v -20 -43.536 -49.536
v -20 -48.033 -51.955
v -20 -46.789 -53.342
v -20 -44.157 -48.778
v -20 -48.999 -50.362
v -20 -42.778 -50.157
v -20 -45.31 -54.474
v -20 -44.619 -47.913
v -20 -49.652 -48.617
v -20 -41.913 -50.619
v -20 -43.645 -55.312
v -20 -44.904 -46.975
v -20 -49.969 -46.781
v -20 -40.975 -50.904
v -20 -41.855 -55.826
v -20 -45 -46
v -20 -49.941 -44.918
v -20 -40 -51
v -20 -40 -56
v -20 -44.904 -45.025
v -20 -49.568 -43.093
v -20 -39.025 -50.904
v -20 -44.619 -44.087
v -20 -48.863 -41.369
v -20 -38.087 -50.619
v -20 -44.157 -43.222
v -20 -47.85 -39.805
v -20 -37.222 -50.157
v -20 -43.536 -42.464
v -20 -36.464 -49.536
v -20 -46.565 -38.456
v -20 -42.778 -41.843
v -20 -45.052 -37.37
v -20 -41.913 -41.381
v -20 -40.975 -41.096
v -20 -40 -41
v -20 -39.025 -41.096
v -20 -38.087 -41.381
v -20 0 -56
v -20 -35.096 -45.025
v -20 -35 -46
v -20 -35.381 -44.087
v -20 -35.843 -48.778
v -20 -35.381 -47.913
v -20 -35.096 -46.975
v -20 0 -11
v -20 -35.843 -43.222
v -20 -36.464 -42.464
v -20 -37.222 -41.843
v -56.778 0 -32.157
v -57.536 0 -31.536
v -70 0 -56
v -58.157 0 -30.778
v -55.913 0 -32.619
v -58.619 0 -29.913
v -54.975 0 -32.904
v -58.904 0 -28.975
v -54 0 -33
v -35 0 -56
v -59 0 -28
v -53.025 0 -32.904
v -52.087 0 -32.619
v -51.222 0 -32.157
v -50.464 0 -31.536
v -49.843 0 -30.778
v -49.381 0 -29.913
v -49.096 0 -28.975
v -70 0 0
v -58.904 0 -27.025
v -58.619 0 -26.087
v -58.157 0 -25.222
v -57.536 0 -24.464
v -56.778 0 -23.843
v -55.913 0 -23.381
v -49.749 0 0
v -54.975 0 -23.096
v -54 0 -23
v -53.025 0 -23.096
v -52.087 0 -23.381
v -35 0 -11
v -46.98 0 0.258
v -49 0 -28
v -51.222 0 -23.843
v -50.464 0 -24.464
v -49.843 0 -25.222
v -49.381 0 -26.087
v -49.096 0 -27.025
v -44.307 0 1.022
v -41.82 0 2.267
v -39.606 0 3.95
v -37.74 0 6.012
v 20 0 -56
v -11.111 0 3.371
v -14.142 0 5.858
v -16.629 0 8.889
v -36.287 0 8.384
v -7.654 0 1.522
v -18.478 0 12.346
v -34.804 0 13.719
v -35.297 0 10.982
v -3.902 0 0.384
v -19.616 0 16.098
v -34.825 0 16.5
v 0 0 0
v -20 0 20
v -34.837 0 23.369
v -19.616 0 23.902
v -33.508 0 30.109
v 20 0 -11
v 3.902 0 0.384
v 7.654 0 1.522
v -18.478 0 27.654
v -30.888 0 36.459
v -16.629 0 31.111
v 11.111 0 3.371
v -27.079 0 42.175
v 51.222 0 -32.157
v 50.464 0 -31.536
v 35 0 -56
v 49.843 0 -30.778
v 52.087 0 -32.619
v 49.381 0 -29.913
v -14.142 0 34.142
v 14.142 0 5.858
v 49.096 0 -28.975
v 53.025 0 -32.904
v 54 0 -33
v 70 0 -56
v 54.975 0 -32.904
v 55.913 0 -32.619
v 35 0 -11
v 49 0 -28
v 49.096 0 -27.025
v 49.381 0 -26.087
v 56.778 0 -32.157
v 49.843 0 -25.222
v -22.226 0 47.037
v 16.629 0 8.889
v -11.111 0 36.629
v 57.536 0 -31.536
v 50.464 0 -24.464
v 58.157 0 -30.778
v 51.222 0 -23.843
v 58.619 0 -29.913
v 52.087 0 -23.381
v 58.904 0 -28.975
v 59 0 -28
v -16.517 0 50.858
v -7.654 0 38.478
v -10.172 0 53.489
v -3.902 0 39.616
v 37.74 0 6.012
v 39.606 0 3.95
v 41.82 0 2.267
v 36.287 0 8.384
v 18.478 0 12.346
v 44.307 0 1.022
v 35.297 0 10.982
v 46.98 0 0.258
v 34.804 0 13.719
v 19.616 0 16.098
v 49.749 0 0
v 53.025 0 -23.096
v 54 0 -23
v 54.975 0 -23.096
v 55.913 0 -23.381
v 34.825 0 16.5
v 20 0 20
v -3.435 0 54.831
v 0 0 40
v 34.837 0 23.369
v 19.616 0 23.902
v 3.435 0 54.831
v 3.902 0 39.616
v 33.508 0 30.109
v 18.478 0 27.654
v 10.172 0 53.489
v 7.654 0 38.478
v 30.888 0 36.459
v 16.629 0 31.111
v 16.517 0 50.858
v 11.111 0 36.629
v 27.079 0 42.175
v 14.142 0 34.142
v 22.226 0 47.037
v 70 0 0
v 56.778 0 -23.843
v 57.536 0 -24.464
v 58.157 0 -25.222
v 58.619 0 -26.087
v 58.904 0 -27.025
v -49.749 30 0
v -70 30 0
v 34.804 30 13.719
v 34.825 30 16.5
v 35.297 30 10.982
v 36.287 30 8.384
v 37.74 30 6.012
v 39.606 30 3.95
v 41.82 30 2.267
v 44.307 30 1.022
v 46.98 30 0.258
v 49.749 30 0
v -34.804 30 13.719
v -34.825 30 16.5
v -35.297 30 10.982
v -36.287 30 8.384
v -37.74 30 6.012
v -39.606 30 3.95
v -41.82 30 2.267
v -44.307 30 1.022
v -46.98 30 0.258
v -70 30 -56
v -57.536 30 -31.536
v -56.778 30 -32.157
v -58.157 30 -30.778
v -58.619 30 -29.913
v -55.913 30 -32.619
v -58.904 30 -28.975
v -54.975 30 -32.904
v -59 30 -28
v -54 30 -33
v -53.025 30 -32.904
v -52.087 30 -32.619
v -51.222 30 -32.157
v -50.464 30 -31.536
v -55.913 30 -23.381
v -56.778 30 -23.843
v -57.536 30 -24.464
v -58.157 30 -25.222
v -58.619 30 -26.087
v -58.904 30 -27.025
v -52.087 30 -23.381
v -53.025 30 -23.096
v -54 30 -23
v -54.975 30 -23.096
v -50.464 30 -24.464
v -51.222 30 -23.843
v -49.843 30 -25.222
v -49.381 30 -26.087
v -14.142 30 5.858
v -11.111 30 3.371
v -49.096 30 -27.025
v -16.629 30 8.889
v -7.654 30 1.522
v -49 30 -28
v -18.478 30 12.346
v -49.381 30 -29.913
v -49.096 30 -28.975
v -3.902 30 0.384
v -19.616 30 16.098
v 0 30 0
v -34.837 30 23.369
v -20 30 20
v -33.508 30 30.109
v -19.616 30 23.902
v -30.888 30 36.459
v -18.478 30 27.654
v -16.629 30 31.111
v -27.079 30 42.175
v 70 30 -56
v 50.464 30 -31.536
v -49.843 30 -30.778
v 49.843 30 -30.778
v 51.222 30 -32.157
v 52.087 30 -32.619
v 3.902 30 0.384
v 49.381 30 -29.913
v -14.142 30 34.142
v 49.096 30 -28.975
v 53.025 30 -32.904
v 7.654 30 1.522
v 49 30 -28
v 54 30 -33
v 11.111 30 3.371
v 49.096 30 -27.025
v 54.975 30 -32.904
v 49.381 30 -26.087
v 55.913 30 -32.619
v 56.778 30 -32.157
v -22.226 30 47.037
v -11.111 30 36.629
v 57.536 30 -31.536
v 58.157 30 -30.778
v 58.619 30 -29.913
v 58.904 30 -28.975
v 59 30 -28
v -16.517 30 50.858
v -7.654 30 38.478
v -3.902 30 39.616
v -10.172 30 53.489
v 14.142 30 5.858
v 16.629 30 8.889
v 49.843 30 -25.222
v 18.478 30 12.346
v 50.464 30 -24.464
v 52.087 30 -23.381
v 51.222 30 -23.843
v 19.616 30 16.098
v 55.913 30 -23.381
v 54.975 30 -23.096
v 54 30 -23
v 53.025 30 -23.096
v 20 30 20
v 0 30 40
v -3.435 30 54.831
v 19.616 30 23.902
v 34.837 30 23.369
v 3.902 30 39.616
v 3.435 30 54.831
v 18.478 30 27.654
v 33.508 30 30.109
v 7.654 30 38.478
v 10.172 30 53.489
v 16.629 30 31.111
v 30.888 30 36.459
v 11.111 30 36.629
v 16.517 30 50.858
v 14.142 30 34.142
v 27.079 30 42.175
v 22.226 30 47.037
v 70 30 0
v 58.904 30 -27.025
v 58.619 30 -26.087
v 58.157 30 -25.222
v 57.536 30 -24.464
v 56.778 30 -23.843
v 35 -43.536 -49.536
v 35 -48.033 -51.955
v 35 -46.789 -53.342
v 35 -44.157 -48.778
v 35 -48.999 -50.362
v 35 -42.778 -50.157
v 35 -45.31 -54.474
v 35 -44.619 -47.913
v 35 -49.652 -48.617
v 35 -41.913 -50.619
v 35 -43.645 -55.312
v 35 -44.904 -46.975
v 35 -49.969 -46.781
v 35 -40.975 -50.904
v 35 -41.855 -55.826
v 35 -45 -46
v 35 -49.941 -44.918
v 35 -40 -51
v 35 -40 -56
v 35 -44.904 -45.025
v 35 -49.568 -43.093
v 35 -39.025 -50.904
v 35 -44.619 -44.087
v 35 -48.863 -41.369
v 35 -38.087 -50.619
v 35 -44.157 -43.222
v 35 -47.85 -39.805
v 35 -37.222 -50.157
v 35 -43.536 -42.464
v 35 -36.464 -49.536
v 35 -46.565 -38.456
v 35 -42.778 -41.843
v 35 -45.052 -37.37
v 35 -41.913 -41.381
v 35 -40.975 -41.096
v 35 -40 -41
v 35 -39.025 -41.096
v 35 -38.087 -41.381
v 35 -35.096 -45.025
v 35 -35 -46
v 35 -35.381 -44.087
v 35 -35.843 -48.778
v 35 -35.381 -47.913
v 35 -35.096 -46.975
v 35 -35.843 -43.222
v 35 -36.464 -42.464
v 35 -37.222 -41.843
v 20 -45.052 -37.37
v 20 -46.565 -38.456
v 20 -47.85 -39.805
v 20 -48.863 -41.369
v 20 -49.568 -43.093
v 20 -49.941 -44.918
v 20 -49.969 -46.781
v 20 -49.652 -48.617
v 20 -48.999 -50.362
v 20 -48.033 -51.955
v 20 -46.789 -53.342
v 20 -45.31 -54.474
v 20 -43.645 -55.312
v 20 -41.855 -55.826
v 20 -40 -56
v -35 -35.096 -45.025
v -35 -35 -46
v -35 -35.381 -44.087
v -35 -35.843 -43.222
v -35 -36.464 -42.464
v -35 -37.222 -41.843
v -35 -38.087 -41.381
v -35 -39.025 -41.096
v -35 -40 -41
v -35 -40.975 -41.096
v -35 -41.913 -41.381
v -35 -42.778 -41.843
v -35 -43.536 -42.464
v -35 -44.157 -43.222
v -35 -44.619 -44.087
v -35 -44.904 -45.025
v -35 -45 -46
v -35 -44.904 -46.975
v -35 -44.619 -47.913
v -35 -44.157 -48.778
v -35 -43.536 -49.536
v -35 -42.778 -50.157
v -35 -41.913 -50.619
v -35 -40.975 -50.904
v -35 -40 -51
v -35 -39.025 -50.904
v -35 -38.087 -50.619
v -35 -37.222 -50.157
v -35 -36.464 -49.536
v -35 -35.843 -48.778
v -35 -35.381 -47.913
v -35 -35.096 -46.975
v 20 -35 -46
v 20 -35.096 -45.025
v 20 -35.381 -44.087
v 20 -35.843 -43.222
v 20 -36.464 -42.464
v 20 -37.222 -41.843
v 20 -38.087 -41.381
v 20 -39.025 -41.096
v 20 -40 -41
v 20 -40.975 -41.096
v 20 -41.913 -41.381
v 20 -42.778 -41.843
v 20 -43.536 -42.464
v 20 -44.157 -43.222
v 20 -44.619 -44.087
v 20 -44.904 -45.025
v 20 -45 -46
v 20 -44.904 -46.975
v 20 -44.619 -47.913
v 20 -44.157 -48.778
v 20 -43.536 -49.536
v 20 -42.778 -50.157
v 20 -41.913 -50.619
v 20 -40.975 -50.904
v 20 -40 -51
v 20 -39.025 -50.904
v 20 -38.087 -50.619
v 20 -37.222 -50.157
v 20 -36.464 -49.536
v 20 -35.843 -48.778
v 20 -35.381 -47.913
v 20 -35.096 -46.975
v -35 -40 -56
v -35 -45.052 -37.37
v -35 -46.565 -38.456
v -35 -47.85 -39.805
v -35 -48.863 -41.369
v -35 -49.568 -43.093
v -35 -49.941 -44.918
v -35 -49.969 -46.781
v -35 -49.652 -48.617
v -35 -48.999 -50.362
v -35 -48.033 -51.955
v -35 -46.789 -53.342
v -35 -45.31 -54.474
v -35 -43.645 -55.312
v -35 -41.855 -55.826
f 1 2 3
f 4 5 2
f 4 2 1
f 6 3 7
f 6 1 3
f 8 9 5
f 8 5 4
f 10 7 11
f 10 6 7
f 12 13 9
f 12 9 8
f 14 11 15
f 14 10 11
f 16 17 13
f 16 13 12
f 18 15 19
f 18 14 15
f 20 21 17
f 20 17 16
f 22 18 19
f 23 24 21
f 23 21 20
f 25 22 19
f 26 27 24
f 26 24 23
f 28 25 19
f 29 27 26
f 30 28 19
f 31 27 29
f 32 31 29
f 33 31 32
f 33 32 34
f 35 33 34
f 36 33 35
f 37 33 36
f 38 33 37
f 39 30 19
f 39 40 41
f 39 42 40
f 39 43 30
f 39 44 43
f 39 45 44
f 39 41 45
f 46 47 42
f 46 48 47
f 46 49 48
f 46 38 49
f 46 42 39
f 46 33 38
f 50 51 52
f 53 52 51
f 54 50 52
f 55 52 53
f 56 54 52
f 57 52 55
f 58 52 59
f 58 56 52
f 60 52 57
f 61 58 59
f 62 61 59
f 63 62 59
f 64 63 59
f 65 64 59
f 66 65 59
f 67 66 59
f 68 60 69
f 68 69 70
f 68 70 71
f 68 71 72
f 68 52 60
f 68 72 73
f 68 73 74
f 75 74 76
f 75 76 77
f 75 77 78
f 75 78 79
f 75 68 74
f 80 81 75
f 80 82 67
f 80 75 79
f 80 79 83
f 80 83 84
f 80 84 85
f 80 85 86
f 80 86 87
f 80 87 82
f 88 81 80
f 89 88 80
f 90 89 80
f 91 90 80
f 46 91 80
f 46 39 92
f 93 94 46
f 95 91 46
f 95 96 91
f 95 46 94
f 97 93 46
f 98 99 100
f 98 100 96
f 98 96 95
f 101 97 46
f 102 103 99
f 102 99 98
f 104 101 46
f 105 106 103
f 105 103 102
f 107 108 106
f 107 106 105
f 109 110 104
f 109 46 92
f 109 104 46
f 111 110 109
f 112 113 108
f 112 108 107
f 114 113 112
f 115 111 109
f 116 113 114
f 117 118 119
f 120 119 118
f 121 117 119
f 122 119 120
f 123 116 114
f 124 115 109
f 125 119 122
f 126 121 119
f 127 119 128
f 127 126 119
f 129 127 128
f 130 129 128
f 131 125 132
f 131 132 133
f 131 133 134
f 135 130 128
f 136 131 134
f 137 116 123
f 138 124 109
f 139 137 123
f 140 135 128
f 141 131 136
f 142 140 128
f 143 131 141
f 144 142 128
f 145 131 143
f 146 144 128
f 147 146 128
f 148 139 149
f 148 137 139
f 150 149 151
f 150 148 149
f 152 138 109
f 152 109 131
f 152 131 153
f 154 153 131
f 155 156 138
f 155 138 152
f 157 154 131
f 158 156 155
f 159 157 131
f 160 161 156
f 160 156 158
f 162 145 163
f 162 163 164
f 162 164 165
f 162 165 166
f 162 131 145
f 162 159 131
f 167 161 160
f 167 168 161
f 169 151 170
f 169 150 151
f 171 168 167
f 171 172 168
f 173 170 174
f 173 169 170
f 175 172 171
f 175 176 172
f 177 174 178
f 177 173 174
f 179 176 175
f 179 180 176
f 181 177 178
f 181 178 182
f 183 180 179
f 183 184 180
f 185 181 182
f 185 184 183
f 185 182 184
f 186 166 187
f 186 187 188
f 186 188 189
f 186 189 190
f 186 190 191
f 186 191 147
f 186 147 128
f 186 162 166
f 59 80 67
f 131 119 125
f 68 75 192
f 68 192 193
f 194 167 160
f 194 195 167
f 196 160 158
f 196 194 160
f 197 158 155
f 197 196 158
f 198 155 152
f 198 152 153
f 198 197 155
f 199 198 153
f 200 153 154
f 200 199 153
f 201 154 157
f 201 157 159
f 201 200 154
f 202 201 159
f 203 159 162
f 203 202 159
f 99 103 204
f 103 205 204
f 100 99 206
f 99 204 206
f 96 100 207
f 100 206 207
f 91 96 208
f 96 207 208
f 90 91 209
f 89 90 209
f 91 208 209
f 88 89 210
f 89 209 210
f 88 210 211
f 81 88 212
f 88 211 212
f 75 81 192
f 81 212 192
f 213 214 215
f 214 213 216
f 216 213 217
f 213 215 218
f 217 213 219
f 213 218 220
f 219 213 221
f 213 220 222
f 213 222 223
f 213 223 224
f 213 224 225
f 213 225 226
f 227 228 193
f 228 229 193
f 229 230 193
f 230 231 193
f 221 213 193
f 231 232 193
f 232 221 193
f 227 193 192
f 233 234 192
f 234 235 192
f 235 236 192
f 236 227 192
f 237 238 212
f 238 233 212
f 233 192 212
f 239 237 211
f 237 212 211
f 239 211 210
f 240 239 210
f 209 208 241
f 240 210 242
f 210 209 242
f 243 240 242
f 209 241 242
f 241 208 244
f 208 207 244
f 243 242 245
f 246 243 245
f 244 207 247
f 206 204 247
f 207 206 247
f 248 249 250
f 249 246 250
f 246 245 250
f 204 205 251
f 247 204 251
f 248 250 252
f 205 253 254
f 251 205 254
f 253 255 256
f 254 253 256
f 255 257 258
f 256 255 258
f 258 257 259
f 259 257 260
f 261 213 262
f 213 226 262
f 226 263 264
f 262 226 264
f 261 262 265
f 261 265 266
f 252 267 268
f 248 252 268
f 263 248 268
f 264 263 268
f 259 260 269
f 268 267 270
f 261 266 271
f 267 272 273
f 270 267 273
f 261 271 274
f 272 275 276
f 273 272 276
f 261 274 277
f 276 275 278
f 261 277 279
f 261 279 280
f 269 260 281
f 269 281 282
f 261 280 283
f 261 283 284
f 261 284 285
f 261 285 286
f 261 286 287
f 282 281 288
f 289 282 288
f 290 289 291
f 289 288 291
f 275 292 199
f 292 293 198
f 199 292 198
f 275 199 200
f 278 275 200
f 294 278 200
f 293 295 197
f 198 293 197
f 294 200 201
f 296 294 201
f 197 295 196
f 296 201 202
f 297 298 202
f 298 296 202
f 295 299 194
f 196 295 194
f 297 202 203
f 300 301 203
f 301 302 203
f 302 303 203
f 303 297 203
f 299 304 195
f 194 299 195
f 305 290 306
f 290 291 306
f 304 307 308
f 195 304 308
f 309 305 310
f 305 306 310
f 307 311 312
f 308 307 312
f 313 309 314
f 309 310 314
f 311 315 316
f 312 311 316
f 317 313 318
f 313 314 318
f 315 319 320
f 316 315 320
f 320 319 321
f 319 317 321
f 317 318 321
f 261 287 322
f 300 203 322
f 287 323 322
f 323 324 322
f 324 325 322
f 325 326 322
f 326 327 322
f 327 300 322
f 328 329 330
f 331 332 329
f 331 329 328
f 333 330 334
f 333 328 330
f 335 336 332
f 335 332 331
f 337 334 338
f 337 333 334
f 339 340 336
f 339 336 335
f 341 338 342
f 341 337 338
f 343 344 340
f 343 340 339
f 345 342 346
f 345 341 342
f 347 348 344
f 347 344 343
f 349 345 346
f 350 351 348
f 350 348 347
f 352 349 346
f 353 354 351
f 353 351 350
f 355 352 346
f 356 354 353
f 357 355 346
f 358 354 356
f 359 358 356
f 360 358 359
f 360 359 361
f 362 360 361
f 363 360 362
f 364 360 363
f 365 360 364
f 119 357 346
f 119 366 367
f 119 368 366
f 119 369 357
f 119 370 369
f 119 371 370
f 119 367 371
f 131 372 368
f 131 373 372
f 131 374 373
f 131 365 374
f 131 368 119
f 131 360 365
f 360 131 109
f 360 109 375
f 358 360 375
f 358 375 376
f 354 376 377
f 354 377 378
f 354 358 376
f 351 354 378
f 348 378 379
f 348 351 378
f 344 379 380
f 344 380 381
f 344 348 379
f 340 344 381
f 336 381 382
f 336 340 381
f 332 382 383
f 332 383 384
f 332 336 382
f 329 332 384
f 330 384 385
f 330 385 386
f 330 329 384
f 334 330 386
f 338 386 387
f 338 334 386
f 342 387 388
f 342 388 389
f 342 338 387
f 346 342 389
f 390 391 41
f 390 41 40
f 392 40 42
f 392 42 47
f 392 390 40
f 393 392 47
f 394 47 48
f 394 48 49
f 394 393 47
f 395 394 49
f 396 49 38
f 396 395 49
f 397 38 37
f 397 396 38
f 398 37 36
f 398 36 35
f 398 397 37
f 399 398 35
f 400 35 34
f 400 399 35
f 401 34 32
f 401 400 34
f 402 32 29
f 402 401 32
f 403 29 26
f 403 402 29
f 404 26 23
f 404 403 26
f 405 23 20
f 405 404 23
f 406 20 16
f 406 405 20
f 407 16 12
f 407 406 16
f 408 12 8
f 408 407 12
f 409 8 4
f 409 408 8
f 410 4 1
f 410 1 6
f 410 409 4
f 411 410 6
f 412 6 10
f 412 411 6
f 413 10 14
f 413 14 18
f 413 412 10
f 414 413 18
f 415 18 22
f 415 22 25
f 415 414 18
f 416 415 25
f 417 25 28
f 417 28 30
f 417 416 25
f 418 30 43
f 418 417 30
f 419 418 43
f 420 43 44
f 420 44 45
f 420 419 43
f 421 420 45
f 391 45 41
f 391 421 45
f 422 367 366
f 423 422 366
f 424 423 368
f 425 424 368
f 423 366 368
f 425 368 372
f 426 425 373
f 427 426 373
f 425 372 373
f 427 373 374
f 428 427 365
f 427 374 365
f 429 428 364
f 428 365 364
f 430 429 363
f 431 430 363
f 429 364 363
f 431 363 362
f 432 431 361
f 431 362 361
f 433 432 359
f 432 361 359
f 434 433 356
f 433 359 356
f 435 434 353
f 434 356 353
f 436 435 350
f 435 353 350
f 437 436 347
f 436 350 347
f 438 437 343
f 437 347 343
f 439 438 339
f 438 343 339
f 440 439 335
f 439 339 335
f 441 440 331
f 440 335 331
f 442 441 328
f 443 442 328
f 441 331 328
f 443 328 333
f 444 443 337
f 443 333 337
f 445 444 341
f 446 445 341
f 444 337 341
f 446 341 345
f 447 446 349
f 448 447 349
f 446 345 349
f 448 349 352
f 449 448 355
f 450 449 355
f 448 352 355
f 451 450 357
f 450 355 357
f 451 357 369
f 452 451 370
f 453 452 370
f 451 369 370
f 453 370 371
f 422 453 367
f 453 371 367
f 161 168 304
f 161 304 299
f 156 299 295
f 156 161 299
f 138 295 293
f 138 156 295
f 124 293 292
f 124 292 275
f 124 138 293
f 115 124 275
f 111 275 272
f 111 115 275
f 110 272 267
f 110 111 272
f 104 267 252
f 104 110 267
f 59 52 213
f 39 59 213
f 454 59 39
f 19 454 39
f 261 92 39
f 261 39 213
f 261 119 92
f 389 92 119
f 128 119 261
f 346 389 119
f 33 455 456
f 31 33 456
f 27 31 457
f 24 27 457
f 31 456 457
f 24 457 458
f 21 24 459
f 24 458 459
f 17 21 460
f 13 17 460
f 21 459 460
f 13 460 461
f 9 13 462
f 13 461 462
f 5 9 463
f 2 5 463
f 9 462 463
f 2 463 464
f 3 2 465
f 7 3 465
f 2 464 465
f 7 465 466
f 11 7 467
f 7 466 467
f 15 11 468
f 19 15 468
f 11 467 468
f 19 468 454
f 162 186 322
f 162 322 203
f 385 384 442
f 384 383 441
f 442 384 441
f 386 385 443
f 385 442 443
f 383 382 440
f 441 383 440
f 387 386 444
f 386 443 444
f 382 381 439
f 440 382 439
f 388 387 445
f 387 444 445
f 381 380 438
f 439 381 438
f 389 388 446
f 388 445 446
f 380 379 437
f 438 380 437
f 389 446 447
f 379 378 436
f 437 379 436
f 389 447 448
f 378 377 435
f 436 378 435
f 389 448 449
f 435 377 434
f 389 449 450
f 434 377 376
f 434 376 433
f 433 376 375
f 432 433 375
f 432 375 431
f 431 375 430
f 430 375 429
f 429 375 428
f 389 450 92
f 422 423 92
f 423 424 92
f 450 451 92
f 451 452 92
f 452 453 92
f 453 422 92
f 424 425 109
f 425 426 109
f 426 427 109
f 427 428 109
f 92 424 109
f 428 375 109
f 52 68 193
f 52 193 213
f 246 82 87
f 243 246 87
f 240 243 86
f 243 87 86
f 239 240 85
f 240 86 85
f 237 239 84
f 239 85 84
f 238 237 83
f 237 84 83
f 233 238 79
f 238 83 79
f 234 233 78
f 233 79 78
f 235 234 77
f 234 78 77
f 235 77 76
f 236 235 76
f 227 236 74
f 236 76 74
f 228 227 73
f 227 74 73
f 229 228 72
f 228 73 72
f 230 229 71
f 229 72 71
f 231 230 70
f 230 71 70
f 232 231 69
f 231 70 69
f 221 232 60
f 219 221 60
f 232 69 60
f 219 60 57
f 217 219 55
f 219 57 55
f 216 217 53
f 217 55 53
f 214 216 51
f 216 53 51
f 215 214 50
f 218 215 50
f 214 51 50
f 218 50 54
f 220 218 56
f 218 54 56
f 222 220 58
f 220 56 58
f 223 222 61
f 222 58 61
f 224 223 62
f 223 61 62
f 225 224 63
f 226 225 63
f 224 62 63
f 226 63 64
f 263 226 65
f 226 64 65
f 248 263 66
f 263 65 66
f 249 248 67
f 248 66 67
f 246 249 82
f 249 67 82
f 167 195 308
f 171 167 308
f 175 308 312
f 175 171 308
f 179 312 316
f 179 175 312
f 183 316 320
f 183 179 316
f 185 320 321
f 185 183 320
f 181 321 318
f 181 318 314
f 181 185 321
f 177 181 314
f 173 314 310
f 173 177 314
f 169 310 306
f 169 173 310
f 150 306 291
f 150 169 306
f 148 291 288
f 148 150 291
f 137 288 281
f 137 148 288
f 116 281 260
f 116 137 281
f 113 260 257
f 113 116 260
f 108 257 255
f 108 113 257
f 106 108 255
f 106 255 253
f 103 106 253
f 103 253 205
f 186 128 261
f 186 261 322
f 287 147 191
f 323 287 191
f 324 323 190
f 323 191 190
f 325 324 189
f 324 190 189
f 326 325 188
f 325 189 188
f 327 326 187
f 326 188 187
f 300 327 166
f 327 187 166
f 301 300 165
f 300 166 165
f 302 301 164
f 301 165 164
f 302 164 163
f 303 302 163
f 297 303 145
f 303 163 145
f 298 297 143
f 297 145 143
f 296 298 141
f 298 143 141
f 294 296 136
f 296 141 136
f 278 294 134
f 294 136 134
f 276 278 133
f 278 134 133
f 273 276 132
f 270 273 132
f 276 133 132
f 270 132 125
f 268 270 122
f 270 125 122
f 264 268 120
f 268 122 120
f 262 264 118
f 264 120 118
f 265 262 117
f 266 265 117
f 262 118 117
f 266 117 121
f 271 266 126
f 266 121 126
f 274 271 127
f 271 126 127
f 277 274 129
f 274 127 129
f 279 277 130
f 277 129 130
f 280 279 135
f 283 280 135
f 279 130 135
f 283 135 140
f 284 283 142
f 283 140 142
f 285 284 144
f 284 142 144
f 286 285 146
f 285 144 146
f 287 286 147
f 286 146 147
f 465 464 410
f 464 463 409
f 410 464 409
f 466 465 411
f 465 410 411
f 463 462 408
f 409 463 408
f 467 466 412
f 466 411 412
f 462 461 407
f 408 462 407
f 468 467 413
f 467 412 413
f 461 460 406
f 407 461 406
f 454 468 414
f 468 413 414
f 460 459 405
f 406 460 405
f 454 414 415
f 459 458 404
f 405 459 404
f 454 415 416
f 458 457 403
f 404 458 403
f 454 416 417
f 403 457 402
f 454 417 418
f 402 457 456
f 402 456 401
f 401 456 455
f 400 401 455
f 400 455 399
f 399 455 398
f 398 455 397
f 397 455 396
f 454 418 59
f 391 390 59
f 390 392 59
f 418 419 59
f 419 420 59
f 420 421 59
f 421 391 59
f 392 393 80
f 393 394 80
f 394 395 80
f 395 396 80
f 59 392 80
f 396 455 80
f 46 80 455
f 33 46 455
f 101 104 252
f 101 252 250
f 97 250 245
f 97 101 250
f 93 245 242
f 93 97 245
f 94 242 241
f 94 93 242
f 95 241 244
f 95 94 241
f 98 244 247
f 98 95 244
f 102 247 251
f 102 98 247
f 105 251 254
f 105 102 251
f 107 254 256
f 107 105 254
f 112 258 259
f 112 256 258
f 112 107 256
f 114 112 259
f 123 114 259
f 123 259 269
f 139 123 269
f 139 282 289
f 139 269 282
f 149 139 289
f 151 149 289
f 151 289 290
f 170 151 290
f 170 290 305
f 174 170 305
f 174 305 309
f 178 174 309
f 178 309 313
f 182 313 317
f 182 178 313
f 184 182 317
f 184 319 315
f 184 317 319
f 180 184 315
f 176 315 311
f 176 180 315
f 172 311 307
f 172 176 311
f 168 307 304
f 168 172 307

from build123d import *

# Parameters (mm, degrees)
F0_R     = 5
F3_DEPTH = 30
F4_R     = 15
F2_R     = 5
F5_DEPTH = 15


with BuildPart() as f3:
    # F0 (on Front) → F3 (new body)
    with BuildSketch(Plane.XZ):
        with BuildLine():
            ThreePointArc((28.7228132327, 0), (0, 55), (-28.7228132327, 0))
            Line((-28.7228132327, 0), (0, 0))
            Line((0, 0), (28.7228132327, 0))
        make_face()
        with BuildLine():
            ThreePointArc((20, 20), (14.1421356237, 5.8578643763), (0, 0))
            ThreePointArc((0, 0), (-14.1421356237, 34.1421356237), (20, 20))
        make_face(mode=Mode.SUBTRACT)
        Polygon((-28.7228132327, 0), (-70, 0), (-70, -56), (70, -56), (70, 0), (28.7228132327, 0), (0, 0), align=None)
        with Locations((-54, -28)):
            Circle(F0_R, mode=Mode.SUBTRACT)
        with Locations((54, -28)):
            Circle(F0_R, mode=Mode.SUBTRACT)
    extrude(amount=-F3_DEPTH)

    # F4
    f4_edges = [f3.edges().sort_by_distance(p)[0] for p in [
        (-28.722813, 15, 0),
        (28.722813, 15, 0),
    ]]
    fillet(f4_edges, radius=F4_R)

    # F2 (on plane+point) → F5 (join)
    with BuildSketch(Plane.YZ.offset(-35)):
        with BuildLine():
            Line((0, -56), (0, -11))
            Line((0, -11), (-45.0515173064, -37.369694507))
            ThreePointArc((-45.0515173064, -37.369694507), (-49.6515038966, -48.6169586422), (-40, -56))
            Line((-40, -56), (0, -56))
        make_face()
        with Locations((-40, -46)):
            Circle(F2_R, mode=Mode.SUBTRACT)
    extrude(amount=F5_DEPTH)

    # F6: F3 across plane


with BuildPart() as f3_1:
    add(f3.part)
    add(f3.part.mirror(Plane.YZ))


solid = f3_1.part
